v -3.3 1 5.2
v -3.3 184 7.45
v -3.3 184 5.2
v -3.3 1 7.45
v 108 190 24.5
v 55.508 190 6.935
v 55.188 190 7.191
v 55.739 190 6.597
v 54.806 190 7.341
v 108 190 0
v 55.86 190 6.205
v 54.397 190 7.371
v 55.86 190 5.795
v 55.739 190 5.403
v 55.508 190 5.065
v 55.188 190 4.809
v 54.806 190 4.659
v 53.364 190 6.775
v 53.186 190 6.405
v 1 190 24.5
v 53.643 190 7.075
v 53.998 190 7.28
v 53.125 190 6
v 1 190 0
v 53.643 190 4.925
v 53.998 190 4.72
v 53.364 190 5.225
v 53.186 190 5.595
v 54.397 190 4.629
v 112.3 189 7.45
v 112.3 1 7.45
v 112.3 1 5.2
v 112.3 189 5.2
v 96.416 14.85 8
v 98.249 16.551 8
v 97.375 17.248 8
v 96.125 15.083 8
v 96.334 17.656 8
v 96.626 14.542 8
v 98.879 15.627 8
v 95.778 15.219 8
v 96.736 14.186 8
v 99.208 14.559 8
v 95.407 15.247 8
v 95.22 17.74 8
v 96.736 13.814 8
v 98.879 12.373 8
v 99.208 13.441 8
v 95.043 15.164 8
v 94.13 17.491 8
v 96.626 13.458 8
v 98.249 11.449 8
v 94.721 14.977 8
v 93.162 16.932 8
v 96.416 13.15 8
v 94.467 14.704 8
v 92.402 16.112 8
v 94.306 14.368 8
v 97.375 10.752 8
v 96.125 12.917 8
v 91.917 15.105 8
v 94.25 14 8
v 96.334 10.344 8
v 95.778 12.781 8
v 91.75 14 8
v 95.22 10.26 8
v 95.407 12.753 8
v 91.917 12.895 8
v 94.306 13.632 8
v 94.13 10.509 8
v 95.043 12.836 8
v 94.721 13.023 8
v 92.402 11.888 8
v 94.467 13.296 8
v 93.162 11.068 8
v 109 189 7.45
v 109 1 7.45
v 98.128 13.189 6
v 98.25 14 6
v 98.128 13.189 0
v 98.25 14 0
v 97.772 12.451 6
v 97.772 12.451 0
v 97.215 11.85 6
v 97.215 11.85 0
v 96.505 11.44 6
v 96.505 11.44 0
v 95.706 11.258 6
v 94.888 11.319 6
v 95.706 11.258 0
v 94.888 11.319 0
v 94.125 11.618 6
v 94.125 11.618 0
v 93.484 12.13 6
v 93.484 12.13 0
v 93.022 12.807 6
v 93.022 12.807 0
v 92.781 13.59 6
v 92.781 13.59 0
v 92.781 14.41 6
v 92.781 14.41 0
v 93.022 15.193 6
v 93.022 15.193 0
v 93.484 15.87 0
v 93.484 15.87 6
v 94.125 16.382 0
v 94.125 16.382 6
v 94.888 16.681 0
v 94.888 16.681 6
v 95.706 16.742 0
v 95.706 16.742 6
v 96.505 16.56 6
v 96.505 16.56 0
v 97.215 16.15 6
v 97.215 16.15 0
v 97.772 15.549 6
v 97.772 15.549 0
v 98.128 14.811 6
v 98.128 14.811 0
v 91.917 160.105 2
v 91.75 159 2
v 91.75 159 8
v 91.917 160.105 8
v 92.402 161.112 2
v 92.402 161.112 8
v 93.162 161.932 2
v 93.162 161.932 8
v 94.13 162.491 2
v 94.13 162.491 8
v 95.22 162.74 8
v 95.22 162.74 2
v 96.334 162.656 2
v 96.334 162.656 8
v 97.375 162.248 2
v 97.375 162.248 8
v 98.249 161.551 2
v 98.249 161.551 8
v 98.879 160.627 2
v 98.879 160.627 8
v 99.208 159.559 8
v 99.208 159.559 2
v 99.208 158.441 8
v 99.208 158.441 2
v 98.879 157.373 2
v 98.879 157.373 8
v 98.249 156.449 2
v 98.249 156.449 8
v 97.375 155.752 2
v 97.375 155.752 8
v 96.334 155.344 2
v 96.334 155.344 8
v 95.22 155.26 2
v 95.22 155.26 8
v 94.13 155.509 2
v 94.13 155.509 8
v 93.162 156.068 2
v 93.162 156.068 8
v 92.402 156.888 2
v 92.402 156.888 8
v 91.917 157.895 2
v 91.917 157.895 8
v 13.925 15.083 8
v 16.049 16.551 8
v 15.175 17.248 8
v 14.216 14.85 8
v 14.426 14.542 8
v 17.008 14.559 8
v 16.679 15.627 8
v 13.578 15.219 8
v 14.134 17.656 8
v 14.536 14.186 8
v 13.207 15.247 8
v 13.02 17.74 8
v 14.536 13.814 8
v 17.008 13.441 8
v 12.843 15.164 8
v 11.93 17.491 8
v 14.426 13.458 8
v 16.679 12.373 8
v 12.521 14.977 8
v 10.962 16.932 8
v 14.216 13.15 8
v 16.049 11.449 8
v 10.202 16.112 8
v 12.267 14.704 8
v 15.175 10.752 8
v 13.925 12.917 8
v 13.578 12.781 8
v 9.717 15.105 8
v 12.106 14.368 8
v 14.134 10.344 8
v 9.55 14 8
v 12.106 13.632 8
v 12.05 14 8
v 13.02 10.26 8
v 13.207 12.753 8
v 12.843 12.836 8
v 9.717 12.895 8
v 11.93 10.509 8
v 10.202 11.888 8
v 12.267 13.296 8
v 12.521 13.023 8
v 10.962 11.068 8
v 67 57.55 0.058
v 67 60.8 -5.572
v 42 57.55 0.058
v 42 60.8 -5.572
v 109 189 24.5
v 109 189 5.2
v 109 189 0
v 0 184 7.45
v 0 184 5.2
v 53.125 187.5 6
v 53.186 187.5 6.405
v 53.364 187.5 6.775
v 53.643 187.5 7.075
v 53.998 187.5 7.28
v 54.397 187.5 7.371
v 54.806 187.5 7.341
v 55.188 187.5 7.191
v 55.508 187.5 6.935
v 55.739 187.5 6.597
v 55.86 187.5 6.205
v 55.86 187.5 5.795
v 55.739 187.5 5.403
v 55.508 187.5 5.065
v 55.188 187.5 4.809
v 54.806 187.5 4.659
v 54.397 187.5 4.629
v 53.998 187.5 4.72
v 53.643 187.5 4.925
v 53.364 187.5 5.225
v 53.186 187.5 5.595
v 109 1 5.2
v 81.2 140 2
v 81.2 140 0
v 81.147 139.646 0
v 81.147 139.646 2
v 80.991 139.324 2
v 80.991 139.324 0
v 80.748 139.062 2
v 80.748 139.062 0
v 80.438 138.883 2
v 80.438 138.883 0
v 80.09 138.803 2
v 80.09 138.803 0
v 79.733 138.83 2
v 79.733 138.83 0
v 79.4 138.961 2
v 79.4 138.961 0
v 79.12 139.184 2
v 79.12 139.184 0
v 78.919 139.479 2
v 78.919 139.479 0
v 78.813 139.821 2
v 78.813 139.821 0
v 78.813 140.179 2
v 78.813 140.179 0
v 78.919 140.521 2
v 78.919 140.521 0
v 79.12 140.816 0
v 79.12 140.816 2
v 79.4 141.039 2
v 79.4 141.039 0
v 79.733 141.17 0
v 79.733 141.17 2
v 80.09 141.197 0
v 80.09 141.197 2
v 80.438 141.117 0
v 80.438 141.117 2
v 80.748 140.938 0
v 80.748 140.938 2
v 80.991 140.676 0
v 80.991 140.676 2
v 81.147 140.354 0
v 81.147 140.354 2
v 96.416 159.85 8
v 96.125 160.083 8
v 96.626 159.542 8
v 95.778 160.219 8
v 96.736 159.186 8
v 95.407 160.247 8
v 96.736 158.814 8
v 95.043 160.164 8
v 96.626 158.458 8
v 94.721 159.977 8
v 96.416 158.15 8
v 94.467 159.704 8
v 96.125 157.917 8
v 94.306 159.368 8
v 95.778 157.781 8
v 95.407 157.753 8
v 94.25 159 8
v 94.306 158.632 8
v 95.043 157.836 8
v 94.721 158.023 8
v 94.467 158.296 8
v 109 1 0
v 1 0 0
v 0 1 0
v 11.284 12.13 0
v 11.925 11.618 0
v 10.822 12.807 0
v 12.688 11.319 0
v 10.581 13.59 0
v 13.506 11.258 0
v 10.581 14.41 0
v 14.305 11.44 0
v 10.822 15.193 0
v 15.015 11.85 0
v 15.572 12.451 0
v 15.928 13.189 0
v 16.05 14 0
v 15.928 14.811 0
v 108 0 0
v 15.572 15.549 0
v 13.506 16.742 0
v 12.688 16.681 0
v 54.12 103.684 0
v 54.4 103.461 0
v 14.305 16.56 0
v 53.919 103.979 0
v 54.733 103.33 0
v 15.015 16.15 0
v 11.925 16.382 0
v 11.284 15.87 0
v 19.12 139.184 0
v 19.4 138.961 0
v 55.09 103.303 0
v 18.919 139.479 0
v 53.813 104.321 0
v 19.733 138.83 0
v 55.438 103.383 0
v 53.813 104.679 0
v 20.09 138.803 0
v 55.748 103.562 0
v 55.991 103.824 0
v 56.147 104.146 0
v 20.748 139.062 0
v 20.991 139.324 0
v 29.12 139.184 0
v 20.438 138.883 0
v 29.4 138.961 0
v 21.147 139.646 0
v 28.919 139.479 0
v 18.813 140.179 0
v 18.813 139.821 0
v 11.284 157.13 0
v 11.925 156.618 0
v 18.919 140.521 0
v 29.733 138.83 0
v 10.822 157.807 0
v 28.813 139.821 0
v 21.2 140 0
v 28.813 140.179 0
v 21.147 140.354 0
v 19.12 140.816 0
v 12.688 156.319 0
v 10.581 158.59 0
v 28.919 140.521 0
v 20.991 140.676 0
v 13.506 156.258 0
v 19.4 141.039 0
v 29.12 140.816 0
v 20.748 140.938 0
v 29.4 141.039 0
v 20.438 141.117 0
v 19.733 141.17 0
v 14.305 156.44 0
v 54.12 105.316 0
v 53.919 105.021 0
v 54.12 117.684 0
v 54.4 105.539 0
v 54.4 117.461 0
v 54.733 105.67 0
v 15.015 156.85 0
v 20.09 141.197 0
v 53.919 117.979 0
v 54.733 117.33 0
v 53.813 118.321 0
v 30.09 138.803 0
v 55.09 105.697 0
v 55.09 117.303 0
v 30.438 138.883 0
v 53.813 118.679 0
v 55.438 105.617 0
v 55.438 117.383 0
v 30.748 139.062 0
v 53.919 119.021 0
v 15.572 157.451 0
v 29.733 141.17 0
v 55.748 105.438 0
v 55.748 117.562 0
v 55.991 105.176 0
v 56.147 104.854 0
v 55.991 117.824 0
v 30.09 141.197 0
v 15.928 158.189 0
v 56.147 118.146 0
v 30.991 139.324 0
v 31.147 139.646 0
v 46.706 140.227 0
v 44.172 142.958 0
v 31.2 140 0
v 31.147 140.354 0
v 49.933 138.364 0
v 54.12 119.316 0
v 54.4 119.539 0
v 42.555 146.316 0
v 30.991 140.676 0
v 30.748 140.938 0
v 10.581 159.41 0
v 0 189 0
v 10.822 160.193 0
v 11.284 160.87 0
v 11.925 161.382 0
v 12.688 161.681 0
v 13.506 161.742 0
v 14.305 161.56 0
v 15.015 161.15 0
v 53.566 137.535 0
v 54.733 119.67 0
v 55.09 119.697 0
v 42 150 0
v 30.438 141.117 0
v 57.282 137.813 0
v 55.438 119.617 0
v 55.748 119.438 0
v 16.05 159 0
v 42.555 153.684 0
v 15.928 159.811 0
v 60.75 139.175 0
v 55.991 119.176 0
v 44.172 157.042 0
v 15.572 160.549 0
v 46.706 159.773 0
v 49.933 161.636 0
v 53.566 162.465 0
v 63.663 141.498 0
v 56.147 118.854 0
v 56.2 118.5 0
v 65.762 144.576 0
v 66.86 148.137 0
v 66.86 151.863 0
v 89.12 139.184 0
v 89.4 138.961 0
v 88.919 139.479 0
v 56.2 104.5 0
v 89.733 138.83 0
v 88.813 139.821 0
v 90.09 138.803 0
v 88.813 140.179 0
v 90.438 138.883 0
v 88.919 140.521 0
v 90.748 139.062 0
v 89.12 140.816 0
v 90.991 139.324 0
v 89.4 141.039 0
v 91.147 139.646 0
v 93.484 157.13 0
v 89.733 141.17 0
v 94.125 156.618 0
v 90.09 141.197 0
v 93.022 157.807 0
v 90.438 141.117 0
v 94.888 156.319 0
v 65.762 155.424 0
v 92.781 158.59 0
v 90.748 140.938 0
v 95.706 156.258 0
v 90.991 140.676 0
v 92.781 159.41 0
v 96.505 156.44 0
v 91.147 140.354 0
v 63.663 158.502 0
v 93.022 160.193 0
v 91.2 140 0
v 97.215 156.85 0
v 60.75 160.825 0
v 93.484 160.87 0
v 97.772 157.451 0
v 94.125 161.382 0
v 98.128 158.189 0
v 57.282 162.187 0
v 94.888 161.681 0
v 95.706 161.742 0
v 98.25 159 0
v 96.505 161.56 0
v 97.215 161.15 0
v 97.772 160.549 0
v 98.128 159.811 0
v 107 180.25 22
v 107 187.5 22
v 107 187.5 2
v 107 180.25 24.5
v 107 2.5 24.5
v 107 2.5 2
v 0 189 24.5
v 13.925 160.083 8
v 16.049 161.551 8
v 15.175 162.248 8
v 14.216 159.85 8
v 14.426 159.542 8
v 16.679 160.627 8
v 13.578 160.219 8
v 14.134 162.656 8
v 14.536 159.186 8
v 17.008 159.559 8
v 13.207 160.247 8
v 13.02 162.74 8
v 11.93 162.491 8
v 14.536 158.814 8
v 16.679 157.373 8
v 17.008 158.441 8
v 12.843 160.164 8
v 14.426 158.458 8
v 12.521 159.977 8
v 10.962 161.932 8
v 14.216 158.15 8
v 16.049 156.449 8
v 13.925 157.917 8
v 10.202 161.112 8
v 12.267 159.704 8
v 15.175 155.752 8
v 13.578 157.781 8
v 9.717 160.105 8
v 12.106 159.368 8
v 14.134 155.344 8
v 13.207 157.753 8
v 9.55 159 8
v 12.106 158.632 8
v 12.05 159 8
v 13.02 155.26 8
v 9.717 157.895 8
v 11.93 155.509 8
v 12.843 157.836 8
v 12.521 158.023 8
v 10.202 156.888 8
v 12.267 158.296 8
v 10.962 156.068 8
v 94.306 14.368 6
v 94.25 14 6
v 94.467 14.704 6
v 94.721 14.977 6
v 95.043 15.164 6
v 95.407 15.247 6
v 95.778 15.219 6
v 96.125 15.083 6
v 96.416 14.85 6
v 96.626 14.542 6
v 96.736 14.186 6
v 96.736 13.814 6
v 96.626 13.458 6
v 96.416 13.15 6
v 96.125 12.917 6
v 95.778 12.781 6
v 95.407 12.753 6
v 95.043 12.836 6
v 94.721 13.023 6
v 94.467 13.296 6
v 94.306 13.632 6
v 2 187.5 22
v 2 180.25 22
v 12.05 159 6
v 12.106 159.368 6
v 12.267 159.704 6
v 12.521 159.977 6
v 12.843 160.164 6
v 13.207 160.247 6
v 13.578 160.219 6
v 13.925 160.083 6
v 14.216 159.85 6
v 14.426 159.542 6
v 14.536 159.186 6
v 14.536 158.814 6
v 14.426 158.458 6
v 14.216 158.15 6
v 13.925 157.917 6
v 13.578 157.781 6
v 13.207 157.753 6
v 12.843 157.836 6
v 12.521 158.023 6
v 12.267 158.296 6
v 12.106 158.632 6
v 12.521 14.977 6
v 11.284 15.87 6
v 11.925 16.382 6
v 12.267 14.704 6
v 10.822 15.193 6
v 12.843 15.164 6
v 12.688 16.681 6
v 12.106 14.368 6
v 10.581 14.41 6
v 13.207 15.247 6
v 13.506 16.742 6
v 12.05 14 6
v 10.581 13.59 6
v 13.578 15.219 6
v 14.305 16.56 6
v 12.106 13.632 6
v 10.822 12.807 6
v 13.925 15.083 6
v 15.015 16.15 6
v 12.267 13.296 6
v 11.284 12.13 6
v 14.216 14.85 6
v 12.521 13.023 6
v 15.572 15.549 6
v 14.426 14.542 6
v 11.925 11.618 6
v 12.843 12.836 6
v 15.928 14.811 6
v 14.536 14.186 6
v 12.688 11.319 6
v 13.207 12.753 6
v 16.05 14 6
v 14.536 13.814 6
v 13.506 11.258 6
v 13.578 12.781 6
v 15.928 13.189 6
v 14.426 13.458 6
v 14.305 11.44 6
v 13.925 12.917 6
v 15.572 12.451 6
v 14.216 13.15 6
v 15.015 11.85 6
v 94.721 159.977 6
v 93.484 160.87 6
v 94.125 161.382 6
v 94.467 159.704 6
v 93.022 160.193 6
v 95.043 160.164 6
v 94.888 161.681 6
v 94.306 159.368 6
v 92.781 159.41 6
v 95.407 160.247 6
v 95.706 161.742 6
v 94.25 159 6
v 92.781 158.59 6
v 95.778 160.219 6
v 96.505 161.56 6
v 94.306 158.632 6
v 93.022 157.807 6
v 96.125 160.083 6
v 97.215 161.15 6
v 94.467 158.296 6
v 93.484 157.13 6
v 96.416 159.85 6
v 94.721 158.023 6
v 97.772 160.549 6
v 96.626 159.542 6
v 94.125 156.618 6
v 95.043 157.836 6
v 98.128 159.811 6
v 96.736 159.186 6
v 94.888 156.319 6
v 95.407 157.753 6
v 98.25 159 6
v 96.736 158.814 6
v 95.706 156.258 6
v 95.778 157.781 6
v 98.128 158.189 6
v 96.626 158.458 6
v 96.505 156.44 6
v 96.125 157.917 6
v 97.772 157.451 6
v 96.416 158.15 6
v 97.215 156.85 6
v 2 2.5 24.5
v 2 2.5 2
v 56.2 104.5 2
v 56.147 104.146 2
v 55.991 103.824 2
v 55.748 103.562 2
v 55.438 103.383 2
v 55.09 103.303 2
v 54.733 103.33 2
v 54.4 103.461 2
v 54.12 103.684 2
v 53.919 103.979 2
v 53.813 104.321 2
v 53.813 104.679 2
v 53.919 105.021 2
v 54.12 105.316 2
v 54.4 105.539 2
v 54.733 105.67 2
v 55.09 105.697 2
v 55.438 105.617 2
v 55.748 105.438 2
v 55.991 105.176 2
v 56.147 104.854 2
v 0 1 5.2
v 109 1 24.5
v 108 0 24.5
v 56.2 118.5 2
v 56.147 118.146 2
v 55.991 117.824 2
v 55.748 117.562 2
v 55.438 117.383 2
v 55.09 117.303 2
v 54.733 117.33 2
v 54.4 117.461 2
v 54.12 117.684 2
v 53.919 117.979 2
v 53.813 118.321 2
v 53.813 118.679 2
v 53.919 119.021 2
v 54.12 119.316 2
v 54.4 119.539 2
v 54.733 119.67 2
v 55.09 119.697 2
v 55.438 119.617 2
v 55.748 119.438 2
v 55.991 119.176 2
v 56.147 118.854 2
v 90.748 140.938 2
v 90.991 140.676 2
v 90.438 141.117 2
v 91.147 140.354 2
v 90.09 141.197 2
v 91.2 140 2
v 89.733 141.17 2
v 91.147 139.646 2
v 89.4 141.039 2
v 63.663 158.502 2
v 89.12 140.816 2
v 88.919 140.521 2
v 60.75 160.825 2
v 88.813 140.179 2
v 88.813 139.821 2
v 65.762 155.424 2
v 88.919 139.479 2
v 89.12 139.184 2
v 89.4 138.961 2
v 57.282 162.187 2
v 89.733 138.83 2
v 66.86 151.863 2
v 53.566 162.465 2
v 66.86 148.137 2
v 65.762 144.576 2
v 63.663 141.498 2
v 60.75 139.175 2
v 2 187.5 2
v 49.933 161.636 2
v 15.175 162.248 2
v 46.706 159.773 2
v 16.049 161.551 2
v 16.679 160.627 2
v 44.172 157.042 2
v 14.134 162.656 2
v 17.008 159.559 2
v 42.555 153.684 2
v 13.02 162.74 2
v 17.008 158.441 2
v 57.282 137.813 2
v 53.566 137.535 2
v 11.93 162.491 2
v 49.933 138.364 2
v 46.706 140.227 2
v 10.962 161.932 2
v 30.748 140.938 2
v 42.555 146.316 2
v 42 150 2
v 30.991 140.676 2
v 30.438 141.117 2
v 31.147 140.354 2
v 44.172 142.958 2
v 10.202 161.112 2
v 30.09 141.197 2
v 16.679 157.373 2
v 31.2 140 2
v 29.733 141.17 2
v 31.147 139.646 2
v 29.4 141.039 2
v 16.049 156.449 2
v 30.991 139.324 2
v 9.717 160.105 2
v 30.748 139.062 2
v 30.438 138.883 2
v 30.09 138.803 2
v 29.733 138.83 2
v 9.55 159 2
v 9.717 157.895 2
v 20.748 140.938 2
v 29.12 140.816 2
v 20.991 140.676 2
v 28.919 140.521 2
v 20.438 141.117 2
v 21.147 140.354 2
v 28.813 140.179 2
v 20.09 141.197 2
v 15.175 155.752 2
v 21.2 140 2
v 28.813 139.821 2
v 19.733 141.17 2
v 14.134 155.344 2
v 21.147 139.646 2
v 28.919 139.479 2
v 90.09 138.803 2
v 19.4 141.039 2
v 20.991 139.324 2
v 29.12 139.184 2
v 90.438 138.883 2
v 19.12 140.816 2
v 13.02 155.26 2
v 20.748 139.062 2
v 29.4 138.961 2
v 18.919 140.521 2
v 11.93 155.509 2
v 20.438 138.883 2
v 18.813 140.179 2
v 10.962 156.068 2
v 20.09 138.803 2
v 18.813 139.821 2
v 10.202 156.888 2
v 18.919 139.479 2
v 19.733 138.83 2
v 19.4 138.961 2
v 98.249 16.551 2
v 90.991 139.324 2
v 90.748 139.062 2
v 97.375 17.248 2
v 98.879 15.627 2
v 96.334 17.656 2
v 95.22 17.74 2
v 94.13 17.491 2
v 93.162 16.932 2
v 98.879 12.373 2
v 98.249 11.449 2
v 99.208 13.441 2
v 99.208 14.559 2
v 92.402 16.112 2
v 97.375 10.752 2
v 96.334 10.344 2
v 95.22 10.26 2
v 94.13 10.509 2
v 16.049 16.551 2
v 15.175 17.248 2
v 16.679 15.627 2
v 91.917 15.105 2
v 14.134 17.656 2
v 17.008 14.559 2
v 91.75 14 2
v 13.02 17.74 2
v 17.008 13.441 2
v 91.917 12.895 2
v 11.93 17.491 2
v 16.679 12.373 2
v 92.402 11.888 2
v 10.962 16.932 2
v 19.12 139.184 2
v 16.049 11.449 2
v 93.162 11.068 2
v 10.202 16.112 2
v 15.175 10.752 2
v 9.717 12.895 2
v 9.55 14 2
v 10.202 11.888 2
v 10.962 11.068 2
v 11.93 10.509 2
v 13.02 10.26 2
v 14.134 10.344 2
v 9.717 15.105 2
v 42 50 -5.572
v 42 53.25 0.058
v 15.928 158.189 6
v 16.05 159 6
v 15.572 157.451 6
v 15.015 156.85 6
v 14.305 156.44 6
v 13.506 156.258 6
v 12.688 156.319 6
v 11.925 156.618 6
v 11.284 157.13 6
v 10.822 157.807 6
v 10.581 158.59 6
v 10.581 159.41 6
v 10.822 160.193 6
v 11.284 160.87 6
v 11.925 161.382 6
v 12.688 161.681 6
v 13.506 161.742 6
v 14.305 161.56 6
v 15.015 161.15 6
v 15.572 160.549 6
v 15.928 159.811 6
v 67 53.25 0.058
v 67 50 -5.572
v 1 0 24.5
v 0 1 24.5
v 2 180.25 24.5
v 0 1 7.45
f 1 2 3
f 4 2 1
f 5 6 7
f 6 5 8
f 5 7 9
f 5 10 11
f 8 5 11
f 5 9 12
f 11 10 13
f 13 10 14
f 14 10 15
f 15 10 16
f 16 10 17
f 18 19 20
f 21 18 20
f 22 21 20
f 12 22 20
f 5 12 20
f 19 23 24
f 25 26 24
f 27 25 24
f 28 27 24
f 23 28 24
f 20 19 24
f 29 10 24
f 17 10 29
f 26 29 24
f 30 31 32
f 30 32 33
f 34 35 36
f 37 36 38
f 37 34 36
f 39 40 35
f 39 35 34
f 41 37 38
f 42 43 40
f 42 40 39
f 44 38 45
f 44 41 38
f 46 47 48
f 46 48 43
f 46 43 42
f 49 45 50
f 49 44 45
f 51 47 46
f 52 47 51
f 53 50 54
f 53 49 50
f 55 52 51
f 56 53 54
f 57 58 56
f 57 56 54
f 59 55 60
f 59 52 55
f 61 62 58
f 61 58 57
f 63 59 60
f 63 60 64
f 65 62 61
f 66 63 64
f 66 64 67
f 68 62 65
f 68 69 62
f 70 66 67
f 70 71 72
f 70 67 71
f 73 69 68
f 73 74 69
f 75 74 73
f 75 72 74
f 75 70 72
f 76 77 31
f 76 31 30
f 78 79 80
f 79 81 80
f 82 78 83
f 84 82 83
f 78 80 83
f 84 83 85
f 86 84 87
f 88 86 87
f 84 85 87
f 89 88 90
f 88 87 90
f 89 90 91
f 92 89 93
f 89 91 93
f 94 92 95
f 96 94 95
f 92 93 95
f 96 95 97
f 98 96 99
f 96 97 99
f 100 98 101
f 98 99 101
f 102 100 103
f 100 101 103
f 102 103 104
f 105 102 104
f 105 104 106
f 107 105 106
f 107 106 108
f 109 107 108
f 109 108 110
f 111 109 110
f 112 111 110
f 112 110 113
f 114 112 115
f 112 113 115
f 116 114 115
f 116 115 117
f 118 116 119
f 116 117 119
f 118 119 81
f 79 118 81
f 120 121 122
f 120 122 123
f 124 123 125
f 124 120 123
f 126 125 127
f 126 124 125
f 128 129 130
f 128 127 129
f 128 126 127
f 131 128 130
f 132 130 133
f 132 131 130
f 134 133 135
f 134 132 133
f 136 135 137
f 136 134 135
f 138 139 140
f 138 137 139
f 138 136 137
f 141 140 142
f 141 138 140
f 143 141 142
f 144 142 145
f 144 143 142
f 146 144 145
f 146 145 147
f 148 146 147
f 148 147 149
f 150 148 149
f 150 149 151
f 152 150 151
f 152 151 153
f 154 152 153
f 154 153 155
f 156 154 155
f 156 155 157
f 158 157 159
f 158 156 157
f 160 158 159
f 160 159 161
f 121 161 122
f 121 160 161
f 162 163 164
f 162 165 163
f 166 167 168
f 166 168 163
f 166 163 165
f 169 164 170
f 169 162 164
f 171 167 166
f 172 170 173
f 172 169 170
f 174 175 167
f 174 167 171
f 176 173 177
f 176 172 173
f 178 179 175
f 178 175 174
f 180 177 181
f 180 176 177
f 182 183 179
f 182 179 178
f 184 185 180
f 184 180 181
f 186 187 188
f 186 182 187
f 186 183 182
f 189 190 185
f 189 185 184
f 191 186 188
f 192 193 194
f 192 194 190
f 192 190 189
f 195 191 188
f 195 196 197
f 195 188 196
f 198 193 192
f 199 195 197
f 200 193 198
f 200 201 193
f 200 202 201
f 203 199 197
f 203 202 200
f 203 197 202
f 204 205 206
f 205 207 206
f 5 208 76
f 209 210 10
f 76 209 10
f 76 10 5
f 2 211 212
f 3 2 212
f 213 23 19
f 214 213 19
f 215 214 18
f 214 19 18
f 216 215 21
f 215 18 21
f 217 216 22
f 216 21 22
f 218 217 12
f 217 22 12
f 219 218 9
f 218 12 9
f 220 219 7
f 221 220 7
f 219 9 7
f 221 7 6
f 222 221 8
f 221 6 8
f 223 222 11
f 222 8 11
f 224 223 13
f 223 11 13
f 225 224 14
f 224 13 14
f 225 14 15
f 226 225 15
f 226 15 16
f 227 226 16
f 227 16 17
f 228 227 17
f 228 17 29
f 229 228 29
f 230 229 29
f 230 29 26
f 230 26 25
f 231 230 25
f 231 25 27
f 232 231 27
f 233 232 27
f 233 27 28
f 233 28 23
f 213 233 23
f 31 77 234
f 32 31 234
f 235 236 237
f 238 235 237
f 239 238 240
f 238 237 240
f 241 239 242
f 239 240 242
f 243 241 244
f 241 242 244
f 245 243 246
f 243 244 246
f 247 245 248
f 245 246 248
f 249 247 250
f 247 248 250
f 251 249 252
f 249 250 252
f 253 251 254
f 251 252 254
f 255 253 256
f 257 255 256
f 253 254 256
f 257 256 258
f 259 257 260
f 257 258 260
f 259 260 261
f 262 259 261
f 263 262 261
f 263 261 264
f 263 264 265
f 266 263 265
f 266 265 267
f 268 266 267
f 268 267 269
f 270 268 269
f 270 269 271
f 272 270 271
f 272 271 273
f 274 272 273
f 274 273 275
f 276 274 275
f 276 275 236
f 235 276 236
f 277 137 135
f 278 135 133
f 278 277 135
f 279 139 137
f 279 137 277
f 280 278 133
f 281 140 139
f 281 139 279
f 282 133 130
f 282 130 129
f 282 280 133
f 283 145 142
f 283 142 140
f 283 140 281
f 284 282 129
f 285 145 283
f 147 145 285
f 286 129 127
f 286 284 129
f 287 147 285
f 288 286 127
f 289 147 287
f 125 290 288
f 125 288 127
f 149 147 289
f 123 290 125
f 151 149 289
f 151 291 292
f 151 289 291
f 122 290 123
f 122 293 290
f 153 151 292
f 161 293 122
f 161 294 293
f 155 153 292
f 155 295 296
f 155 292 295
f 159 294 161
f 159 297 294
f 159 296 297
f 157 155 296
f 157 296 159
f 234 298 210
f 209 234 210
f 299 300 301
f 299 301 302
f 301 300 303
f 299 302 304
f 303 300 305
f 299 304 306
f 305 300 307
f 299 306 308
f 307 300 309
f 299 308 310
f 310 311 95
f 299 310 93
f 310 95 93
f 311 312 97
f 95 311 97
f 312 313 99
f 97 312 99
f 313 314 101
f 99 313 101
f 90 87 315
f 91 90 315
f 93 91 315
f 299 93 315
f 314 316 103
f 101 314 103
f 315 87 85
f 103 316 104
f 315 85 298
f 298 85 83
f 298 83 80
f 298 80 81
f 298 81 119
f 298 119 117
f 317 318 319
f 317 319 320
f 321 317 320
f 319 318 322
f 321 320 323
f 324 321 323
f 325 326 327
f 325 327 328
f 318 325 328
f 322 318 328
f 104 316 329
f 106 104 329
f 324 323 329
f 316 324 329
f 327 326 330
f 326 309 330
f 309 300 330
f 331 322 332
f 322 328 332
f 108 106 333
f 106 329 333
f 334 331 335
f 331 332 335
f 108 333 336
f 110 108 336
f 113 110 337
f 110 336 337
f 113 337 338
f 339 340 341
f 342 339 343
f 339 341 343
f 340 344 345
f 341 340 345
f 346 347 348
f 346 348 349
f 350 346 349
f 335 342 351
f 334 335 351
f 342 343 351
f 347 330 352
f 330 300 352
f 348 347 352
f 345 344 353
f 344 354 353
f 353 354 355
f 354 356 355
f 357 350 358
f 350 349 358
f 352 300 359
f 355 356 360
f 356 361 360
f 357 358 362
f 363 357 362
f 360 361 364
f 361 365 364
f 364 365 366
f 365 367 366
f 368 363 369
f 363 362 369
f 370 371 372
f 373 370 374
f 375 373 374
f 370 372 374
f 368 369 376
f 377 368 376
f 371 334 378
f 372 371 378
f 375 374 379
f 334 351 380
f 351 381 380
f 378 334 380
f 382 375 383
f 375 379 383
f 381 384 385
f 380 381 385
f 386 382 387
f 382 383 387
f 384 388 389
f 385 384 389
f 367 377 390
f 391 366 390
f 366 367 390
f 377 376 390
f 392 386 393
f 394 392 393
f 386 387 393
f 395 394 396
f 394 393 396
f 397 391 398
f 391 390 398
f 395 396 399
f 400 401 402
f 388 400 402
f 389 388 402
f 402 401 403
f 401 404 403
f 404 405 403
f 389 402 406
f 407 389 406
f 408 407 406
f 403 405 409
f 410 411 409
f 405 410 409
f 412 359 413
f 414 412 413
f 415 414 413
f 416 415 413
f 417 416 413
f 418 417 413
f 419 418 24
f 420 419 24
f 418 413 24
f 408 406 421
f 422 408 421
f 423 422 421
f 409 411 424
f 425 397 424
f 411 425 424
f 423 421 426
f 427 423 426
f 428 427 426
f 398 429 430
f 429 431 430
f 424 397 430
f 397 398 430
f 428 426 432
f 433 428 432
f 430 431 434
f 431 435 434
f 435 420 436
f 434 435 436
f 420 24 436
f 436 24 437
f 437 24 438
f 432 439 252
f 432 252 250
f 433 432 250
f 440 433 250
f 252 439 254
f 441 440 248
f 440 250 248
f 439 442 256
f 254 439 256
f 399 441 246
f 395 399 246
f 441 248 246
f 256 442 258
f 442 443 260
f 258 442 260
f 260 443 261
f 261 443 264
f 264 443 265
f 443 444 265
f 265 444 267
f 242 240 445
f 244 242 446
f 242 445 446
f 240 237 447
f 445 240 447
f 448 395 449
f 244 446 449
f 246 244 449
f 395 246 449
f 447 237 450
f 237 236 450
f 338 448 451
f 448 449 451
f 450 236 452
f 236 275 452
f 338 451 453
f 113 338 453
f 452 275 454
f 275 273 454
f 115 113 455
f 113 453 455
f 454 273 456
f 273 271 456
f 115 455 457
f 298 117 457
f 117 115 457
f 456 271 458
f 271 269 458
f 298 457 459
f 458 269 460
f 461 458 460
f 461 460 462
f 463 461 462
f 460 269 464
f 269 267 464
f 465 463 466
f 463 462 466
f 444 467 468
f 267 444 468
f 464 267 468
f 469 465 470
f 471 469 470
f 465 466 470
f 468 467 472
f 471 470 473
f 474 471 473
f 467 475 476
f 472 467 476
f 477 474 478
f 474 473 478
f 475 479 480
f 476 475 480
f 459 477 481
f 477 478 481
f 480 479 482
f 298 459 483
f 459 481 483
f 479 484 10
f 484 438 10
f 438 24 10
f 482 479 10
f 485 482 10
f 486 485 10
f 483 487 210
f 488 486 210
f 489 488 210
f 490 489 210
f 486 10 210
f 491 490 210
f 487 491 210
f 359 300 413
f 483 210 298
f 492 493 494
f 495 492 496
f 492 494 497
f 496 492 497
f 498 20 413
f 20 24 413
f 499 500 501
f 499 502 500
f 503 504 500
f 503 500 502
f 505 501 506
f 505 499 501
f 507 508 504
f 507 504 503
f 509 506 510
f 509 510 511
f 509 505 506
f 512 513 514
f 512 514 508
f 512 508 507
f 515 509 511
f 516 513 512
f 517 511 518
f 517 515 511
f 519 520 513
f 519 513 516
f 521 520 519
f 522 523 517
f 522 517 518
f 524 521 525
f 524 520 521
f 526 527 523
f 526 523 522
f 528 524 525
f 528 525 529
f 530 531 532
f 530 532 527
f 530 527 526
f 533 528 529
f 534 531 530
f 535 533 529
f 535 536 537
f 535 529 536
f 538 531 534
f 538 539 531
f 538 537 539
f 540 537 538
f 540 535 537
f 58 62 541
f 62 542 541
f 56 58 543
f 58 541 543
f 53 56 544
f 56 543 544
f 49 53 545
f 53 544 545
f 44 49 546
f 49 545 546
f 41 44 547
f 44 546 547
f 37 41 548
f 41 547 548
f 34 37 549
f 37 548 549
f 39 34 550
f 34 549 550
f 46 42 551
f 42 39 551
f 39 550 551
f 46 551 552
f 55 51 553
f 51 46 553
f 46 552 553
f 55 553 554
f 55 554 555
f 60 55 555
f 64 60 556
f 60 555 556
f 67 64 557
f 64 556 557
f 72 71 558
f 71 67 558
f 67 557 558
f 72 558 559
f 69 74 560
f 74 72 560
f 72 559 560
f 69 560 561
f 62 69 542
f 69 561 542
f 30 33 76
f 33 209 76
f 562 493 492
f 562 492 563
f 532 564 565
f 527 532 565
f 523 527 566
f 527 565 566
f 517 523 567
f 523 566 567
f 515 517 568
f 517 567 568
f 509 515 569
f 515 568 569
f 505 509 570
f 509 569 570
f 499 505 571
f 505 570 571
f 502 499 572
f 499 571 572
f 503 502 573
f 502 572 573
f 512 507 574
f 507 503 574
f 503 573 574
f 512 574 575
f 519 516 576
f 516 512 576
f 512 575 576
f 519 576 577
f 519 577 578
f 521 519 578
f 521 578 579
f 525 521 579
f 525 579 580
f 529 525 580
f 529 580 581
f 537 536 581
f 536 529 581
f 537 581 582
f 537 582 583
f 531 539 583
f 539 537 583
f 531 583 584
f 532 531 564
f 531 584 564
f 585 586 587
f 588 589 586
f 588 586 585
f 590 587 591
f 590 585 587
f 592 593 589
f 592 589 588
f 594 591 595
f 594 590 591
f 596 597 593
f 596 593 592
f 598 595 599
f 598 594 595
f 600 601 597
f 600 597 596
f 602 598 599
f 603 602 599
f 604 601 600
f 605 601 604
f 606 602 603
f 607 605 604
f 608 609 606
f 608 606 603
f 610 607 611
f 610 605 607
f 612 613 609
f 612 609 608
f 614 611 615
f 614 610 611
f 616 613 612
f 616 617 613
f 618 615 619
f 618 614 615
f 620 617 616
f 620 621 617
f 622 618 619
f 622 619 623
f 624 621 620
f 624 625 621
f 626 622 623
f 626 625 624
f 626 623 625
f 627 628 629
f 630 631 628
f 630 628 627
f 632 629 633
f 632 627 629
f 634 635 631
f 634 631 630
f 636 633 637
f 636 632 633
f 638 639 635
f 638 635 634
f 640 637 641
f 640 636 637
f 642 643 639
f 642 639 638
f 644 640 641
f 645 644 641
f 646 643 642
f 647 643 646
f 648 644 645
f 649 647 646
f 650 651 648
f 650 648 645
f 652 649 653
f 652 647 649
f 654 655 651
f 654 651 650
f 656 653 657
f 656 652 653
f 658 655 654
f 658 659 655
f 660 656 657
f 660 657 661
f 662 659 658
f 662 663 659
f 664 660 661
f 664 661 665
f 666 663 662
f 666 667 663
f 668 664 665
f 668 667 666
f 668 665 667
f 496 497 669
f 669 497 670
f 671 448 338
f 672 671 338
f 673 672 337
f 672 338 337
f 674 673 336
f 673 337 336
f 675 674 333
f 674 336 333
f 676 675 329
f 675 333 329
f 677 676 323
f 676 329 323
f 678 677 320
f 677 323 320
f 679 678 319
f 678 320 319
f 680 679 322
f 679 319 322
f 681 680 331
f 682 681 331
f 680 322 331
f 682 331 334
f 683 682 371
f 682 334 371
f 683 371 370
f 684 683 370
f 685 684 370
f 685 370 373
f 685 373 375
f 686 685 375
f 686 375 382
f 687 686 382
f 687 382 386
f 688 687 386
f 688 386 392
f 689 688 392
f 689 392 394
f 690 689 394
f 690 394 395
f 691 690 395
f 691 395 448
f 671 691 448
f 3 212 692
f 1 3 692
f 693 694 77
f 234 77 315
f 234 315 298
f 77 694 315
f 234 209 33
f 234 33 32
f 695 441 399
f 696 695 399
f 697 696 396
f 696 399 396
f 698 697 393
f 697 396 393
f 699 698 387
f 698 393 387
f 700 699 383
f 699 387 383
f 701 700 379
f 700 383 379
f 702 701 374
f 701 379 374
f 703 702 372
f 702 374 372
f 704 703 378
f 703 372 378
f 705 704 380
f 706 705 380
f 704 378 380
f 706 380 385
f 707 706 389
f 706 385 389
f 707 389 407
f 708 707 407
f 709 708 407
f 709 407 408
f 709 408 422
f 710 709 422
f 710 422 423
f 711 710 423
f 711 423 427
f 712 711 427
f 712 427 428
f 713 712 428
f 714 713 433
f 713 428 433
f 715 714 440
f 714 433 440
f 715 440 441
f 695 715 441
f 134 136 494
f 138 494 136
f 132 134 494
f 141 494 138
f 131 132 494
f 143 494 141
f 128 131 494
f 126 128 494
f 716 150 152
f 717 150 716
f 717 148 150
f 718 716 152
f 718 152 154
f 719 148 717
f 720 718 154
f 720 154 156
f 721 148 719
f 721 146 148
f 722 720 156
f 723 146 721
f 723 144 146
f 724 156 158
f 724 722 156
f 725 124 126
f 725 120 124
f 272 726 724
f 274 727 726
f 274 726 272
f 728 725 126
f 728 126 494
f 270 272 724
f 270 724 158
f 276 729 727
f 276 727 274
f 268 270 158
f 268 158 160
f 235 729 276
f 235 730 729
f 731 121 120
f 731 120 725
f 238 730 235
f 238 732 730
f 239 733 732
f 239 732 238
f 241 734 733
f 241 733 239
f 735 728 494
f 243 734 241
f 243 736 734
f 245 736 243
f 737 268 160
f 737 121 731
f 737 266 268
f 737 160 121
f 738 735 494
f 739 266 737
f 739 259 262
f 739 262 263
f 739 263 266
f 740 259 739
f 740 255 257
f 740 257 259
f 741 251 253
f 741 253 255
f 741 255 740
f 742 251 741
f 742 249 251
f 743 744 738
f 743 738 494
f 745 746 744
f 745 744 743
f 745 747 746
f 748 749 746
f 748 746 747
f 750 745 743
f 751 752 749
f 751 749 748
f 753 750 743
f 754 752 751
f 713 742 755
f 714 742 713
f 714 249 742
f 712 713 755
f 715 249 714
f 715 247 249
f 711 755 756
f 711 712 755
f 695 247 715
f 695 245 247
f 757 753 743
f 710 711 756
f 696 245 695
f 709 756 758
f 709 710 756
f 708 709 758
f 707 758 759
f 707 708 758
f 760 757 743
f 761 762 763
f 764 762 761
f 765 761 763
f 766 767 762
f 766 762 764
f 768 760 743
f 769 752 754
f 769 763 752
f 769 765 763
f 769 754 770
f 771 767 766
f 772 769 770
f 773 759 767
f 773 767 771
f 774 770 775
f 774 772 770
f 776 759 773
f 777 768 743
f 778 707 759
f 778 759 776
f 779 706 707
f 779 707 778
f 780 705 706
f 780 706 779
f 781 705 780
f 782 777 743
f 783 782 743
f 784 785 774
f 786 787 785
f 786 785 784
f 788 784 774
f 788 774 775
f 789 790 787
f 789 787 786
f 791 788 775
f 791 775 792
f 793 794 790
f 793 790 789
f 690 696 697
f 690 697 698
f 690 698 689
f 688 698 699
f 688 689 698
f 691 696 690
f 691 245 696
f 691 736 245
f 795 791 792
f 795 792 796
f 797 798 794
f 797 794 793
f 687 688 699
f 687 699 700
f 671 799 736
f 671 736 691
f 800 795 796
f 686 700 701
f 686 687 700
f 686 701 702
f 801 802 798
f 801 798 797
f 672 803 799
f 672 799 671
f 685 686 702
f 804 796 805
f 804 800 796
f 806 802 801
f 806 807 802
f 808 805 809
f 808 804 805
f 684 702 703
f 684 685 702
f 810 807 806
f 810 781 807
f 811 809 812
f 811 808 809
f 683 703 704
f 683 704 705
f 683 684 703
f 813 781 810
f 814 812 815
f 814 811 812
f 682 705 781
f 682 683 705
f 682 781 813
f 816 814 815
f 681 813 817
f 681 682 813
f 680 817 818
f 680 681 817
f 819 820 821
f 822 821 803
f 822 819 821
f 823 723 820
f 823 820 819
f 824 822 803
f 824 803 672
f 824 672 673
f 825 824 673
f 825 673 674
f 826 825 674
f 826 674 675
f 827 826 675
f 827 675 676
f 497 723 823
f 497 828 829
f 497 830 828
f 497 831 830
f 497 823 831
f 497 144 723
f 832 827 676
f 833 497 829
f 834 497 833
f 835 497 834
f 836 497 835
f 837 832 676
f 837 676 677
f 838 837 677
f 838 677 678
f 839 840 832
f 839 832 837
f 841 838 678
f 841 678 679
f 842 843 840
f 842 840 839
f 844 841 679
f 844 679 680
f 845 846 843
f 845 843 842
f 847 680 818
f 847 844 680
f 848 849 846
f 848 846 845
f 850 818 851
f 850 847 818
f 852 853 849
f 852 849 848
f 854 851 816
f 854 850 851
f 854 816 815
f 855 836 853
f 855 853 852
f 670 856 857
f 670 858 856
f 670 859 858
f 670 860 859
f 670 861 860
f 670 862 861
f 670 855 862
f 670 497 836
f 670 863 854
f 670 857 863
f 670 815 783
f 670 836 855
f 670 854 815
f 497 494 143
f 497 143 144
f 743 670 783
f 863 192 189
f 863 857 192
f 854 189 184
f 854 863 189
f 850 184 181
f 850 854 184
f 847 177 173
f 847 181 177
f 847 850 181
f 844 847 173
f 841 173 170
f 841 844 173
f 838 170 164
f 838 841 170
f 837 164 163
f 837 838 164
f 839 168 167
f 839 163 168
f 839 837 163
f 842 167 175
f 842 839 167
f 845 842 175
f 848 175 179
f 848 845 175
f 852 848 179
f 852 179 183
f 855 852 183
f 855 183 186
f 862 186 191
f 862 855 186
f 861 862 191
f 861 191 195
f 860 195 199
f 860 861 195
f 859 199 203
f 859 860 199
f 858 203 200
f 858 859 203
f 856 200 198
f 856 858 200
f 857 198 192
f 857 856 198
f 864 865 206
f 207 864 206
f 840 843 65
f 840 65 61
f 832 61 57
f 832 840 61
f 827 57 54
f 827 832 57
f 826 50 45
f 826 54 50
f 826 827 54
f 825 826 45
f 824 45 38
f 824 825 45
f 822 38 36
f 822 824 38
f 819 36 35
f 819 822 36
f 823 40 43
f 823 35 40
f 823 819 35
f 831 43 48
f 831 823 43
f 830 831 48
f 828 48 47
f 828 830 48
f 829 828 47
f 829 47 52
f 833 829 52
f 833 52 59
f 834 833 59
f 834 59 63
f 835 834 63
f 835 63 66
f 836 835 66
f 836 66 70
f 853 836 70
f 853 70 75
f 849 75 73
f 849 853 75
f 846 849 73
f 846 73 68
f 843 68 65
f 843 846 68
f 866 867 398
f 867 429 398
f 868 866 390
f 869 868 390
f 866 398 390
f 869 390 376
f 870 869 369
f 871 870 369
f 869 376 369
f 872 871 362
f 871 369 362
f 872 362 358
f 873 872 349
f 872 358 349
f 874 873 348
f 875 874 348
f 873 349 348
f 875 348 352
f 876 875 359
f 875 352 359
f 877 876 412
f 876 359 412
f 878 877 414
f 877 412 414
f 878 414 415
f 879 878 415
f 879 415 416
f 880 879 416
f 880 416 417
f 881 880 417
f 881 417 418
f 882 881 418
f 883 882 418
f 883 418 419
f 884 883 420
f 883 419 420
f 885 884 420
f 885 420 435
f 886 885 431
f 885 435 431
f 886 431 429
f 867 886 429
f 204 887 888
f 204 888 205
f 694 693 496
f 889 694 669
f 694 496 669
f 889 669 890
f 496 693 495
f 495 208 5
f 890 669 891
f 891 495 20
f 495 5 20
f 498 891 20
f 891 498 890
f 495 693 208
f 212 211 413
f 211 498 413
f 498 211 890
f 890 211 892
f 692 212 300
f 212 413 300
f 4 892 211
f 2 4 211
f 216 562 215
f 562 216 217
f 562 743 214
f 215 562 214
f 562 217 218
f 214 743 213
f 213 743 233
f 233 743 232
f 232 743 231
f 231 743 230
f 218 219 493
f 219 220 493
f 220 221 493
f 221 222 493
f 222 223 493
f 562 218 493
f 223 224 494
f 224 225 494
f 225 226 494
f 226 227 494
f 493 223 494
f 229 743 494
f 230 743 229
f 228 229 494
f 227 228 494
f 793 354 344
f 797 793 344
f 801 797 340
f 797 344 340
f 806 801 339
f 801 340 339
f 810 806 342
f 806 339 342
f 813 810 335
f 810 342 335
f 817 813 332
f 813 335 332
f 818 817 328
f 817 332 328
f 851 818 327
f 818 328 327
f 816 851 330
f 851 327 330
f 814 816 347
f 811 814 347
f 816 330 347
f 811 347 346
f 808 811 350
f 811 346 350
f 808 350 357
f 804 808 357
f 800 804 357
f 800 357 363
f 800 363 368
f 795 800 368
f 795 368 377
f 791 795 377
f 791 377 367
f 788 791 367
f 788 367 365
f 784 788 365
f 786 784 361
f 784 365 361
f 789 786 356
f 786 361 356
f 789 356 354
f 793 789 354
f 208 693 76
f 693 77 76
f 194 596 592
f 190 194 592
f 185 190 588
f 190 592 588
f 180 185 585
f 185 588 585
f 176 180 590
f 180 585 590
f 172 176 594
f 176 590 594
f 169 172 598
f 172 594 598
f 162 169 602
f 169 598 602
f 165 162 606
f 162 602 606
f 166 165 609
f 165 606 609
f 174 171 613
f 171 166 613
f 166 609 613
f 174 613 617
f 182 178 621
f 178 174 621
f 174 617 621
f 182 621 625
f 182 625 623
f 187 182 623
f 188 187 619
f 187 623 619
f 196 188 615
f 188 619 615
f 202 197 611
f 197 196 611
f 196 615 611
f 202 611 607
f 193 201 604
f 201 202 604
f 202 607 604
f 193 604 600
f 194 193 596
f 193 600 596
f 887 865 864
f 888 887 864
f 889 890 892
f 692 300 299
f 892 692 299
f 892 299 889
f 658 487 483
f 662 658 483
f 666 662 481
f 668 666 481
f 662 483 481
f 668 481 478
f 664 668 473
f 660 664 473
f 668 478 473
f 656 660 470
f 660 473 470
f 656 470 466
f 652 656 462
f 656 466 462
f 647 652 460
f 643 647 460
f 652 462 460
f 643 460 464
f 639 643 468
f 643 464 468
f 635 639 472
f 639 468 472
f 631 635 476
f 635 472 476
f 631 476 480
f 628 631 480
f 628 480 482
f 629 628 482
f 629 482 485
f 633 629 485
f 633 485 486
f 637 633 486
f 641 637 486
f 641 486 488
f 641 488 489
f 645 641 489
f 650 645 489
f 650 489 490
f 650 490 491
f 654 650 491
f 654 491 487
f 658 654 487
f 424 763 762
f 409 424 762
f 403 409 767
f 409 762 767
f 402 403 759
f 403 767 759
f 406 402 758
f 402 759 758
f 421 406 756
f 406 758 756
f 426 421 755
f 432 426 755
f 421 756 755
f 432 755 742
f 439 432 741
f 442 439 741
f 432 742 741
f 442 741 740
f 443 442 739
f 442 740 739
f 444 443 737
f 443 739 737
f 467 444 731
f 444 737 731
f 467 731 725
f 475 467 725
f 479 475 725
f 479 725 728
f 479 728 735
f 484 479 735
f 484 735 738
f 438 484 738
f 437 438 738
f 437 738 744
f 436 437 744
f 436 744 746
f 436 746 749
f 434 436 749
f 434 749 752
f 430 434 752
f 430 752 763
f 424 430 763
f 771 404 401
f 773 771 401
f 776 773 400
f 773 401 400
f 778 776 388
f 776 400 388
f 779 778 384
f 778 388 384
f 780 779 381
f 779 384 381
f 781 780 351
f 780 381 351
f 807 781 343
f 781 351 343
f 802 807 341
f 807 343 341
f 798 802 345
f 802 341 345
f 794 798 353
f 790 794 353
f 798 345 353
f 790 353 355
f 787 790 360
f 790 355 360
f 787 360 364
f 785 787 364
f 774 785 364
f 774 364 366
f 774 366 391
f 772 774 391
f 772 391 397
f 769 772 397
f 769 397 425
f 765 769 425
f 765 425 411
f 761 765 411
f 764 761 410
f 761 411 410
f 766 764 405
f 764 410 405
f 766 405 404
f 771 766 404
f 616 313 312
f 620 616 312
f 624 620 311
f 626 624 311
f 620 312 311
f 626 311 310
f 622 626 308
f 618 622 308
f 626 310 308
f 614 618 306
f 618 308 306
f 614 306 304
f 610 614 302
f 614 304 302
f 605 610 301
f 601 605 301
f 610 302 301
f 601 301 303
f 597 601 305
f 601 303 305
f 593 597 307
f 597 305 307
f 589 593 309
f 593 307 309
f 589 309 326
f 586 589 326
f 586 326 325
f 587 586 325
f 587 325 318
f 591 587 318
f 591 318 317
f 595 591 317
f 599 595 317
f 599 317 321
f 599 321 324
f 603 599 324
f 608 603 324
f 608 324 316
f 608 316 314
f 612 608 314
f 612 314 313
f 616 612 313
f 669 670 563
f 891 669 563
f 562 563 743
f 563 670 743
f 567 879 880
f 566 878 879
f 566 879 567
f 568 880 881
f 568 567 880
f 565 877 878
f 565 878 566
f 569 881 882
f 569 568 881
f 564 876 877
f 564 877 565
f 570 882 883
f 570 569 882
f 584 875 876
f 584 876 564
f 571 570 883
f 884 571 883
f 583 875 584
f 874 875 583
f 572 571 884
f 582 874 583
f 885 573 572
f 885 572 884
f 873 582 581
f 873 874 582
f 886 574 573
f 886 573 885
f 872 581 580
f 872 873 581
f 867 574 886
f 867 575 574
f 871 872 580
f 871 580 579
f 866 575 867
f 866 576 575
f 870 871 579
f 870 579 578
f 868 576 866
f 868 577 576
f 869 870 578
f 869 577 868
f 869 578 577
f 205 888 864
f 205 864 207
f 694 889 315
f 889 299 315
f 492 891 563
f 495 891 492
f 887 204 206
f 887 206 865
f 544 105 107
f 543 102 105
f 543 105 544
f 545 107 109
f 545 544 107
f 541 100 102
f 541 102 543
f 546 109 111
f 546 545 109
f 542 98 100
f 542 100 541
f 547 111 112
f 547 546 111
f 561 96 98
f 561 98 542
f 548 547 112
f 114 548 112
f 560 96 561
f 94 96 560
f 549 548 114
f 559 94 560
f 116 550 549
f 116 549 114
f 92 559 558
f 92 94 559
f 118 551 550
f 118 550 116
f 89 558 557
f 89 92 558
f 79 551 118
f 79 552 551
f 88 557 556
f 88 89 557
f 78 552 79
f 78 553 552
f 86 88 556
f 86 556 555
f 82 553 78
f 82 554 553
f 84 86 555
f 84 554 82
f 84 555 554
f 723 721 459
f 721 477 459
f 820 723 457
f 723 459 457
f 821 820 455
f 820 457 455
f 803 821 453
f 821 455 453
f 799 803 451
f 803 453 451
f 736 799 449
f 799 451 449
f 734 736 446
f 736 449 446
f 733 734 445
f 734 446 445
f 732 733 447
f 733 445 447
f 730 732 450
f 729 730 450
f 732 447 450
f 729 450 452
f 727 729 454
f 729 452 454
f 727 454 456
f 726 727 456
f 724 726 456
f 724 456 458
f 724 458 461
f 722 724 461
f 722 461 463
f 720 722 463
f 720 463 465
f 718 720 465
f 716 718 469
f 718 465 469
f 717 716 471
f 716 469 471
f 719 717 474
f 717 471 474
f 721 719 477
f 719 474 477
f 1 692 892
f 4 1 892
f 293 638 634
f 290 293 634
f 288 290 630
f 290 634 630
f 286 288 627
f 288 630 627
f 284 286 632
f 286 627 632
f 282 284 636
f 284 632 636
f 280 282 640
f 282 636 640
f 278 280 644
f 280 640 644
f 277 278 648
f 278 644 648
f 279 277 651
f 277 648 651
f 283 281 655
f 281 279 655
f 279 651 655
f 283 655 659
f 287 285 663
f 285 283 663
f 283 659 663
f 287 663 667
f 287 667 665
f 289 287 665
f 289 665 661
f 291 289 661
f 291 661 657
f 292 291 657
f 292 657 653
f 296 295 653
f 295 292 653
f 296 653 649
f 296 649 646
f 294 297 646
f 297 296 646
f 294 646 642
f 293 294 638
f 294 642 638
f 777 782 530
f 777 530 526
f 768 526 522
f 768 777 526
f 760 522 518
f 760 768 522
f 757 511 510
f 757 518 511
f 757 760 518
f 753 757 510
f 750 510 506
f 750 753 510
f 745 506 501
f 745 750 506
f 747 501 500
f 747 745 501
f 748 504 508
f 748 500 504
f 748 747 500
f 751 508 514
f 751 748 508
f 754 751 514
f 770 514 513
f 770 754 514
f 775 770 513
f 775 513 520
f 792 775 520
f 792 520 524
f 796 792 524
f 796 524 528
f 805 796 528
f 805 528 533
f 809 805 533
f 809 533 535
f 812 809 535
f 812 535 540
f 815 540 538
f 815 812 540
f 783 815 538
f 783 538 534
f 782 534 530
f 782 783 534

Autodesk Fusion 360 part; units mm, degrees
sketch "Sketch1" plane through (0, 0, 0) normal (0, 0, 1) x (1, 0, 0)
  line L0 (0, 0) -> (109, 0)
  line L1 (109, 0) -> (109, 190)
  line L2 (109, 190) -> (0, 190)
  line L3 (0, 190) -> (0, 0)
  dimension "d1" = 190
  dimension "d2" = 109
extrude "Extrude1" add sketch "Sketch1" along normal blind 18.5 makes body 1
sketch "Sketch2" plane through (0, 0, 18.5) normal (0, 0, 1) x (-1, 0, 0)
  line L0 (0, -190) -> (0, 0)
  line L1 (0, 0) -> (-109, 0)
  line L2 (-109, 0) -> (-109, -190)
  line L3 (-109, -190) -> (0, -190)
  line L4 (-2, -187.5) -> (-107, -187.5)
  line L5 (-107, -187.5) -> (-107, -2.5)
  line L6 (-107, -2.5) -> (-2, -2.5)
  line L7 (-2, -2.5) -> (-2, -187.5)
  dimension "d5" = 2.5
  dimension "d6" = 2.5
  dimension "d7" = 2
  dimension "d8" = 2
extrude "Extrude2" cut sketch "Sketch2" against normal blind 16.5 contours L4 L5 L6 L7 bodies 1
chamfer "Chamfer1" distance 1 angle 45 4 edges at (0, 190, 9.25) (109, 190, 9.25) (0, 0, 9.25) (109, 0, 9.25) on bodies 1
sketch "Sketch3" plane through (0, 0, 2) normal (0, 0, 1) x (-1, 0, 0)
  line L0 (-2, -2.5) -> (-107, -2.5)
  line L1 (-107, -2.5) -> (-107, -187.5)
  line L2 (-107, -187.5) -> (-2, -187.5)
  line L3 (-2, -187.5) -> (-2, -2.5)
  circle A0 centre (-13.3, -159) radius 1.25
  circle A1 centre (-95.5, -159) radius 1.25
  circle A2 centre (-13.3, -14) radius 1.25
  circle A3 centre (-95.5, -14) radius 1.25
  dimension "d12" = 2.5
  dimension "d13" = 2.5
  dimension "d14" = 2.5
  dimension "d15" = 2.5
  dimension "d17" = 11.3
  dimension "d18" = 11.5
  dimension "d20" = 11.5
  dimension "d21" = 11.5
  dimension "d22" = 11.3
  dimension "d23" = 11.5
  dimension "d26" = 145
  dimension "d27" = 145
extrude "Extrude3" cut sketch "Sketch3" against normal blind 2.5 contours A0 | A1 | A2 | A3 bodies 1
sketch "Sketch4" plane through (0, 0, 0) normal (0, 0, -1) x (1, 0, 0)
  circle A0 centre (95.5, -14) radius 1.25
  circle A1 centre (95.5, -159) radius 1.25
  circle A2 centre (13.3, -14) radius 1.25
  circle A3 centre (13.3, -159) radius 1.25
  line L0 (109, -1) -> (108, 0)
  line L1 (108, 0) -> (1, 0)
  line L2 (1, 0) -> (0, -1)
  line L3 (0, -1) -> (0, -189)
  line L4 (0, -189) -> (1, -190)
  line L5 (1, -190) -> (108, -190)
  line L6 (108, -190) -> (109, -189)
  line L7 (109, -189) -> (109, -1)
  line L8 (6, -177.5) -> (6, -75)
  line L9 (103, -75) -> (103, -177.5)
  line L10 (8.5, -175) -> (8.5, -75)
  line L11 (100.5, -75) -> (100.5, -175)
  line L12 (103, -75) -> (100.5, -75)
  line L13 (8.5, -75) -> (6, -75)
  line L14 (100.5, -175) -> (100.5, -177.5)
  line L15 (8.5, -175) -> (8.5, -177.5)
  line L16 (103, -177.5) -> (103, -190)
  line L17 (6, -190) -> (6, -177.5)
  line L18 (100.5, -177.5) -> (100.5, -190)
  line L19 (103, -190) -> (100.5, -190)
  line L20 (8.5, -177.5) -> (8.5, -190)
  line L21 (6, -190) -> (8.5, -190)
  line L22 (8.5, -190) -> (6, -190)
  dimension "d28" = 6
  dimension "d29" = 6
  dimension "d32" = 2.5
  dimension "d34" = 2.5
  dimension "d38" = 115
  dimension "d39" = 115
sketch "Sketch5" plane through (0, 0, 2) normal (0, 0, 1) x (-1, 0, 0)
  circle A0 centre (-95.5, -14) radius 1.25
  circle A1 centre (-95.5, -159) radius 1.25
  circle A2 centre (-13.3, -14) radius 1.25
  circle A3 centre (-13.3, -159) radius 1.25
  line L0 (-2, -2.5) -> (-107, -2.5)
  line L1 (-107, -2.5) -> (-107, -187.5)
  line L2 (-107, -187.5) -> (-2, -187.5)
  line L3 (-2, -187.5) -> (-2, -2.5)
  circle A4 centre (-54.5, -150) radius 12.5
  line L4 (-109, -189) -> (-109, -1)
  line L5 (-1, -190) -> (-108, -190)
  dimension "d42" = 54.5
  dimension "d43" = 40
  dimension "d44" = 25
extrude "Extrude6" cut sketch "Sketch5" against normal blind 2.5 contours A4 bodies 1
ref_plane "WorkPlane1" through (42, 0, 0) normal (1, 0, 0) x (0, 1, 0)
sketch "Sketch16" plane through (42, 0, 0) normal (1, 0, 0) x (0, 1, 0)
  line L0 (57.55, 0.0575) -> (53.25, 0.0575)
  line L1 (50, -5.5717) -> (60.8, -5.5717)
  line L2 (60.8, -5.5717) -> (57.55, 0.0575)
  line L3 (53.25, 0.0575) -> (50, -5.5717)
  dimension "d74" = 120
  dimension "d75" = 120
  dimension "d76" = 10.8
  dimension "d77" = 6.5
  dimension "d90" = 50
extrude "Extrude16" add sketch "Sketch16" along normal blind 25 separate body makes body 2
sketch "Sketch17" plane through (0, 0, 0) normal (0, 0, -1) x (1, 0, 0)
  circle A0 centre (13.3, -14) radius 1.25
  circle A1 centre (95.5, -14) radius 1.25
  line L0 (1, -190) -> (108, -190)
  line L1 (108, -190) -> (109, -189)
  line L2 (109, -189) -> (109, -1)
  line L3 (109, -1) -> (108, 0)
  line L4 (108, 0) -> (1, 0)
  line L5 (1, 0) -> (0, -1)
  line L6 (0, -1) -> (0, -189)
  line L7 (0, -189) -> (1, -190)
  circle A2 centre (13.3, -159) radius 1.25
  circle A3 centre (95.5, -159) radius 1.25
  circle A4 centre (54.5, -150) radius 12.5
  line L8 (100.5, -182.7) -> (8.5, -182.7)
  line L9 (8.5, -182.7) -> (8.5, -180.7)
  line L10 (8.5, -180.7) -> (100.5, -180.7)
  line L11 (100.5, -180.7) -> (100.5, -182.7)
  dimension "d81" = 2
sketch "Sketch20" plane through (0, 0, 2) normal (0, 0, 1) x (-1, 0, 0)
  circle A0 centre (-54.5, -150) radius 12.5
  circle A1 centre (-95.5, -14) radius 1.25
  circle A2 centre (-95.5, -159) radius 1.25
  circle A3 centre (-13.3, -14) radius 1.25
  circle A4 centre (-13.3, -159) radius 1.25
  line L0 (-2, -2.5) -> (-107, -2.5)
  line L1 (-107, -2.5) -> (-107, -187.5)
  line L2 (-107, -187.5) -> (-2, -187.5)
  line L3 (-2, -187.5) -> (-2, -2.5)
  circle A5 centre (-13.3, -159) radius 3.75
  circle A6 centre (-95.5, -159) radius 3.75
  circle A7 centre (-13.3, -14) radius 3.75
  circle A8 centre (-95.5, -14) radius 3.75
  dimension "d91" = 7.5
  dimension "d92" = 7.5
  dimension "d93" = 7.5
  dimension "d94" = 7.5
extrude "Extrude20" add sketch "Sketch20" along normal blind 6 contours A5 | A6 | A7 | A8 bodies 1
sketch "Sketch21" plane through (0, 0, 18.5) normal (0, 0, 1) x (-1, 0, 0)
  line L0 (-107, -187.5) -> (-107, -2.5)
  line L1 (-107, -2.5) -> (-2, -2.5)
  line L2 (-2, -2.5) -> (-2, -187.5)
  line L3 (-2, -187.5) -> (-107, -187.5)
  line L4 (-108, 0) -> (-109, -1)
  line L5 (-109, -1) -> (-109, -189)
  line L6 (-109, -189) -> (-108, -190)
  line L7 (-108, -190) -> (-1, -190)
  line L8 (-1, -190) -> (0, -189)
  line L9 (0, -189) -> (0, -1)
  line L10 (0, -1) -> (-1, 0)
  line L11 (-1, 0) -> (-108, 0)
  line L12 (-1, -190) -> (-108, -190)
  line L13 (-109, -179) -> (-109, -1)
  line L14 (-108, 0) -> (-1, 0)
  line L15 (0, -1) -> (0, -179)
  line L16 (-108, 0) -> (-109, -1)
  line L17 (0, -1) -> (-1, 0)
  line L18 (0, -189) -> (-1, -190)
  line L19 (-108, -190) -> (-109, -189)
  line L20 (-2, -187.5) -> (-107, -187.5)
  line L21 (-107, -187.5) -> (-107, -2.5)
  line L22 (-107, -2.5) -> (-2, -2.5)
  line L23 (-2, -2.5) -> (-2, -187.5)
extrude "Extrude21" add sketch "Sketch21" along normal blind 6 bodies 1
sketch "Sketch23" plane through (0, 187.5, 0) normal (0, -1, 0) x (1, 0, 0)
  line L0 (2, 24.5) -> (2, 2)
  line L1 (2, 2) -> (107, 2)
  line L2 (107, 2) -> (107, 24.5)
  line L3 (107, 24.5) -> (2, 24.5)
  line L4 (2, 24.5) -> (107, 24.5)
  line L5 (107, 24.5) -> (107, 22)
  line L6 (107, 22) -> (2, 22)
  line L7 (2, 22) -> (2, 24.5)
extrude "Extrude22" add sketch "Sketch23" along normal blind 7.25 contours L0 L2 L3 L4 L5 L6 L7 bodies 1
sketch "Sketch24" plane through (0, 0, 0) normal (0, 0, -1) x (1, 0, 0)
  circle A0 centre (95.5, -14) radius 1.25
  circle A1 centre (13.3, -14) radius 1.25
  circle A2 centre (13.3, -159) radius 1.25
  circle A3 centre (95.5, -159) radius 1.25
  circle A4 centre (54.5, -150) radius 12.5
  line L0 (1, -190) -> (108, -190)
  line L1 (108, -190) -> (109, -189)
  line L2 (109, -189) -> (109, -1)
  line L3 (109, -1) -> (108, 0)
  line L4 (108, 0) -> (1, 0)
  line L5 (1, 0) -> (0, -1)
  line L6 (0, -1) -> (0, -189)
  line L7 (0, -189) -> (1, -190)
  circle A5 centre (13.3, -14) radius 2.75
  circle A6 centre (95.5, -14) radius 2.75
  circle A7 centre (95.5, -159) radius 2.75
  circle A8 centre (13.3, -159) radius 2.75
  circle A9 centre (90, -140) radius 1.2
  circle A10 centre (80, -140) radius 1.2
  circle A11 centre (30, -140) radius 1.2
  circle A12 centre (20, -140) radius 1.2
  circle A13 centre (55, -118.5) radius 1.2
  circle A14 centre (55, -104.5) radius 1.2
  line L8 (2, -2.5) -> (2, -187.5)
  line L9 (42, -60.8) -> (67, -60.8)
  dimension "d102" = 2.4
  dimension "d103" = 2.4
  dimension "d104" = 2.4
  dimension "d105" = 2.4
  dimension "d106" = 5.5
  dimension "d107" = 5.5
  dimension "d108" = 5.5
  dimension "d109" = 5.5
  dimension "d114" = 2.4
  dimension "d115" = 2.4
  dimension "d117" = 14
  dimension "d128" = 53
  dimension "d129" = 53
  dimension "d130" = 43.7
extrude "Extrude23" cut sketch "Sketch24" against normal blind 6 contours A5 | A6 | A7 | A8 bodies 1
extrude "Extrude24" cut sketch "Sketch24" against normal blind 2 contours A9 | A10 | A11 | A12 | A13 | A14 bodies 1
sketch "Sketch25" plane through (0, 0, 0) normal (-1, 0, 0) x (0, -1, 0)
  line L0 (-1, 24.5) -> (-189, 24.5)
  line L1 (-189, 0) -> (-1, 0)
  line L2 (-1, 7.45) -> (-184, 7.45)
  line L3 (-184, 7.45) -> (-184, 5.2)
  line L4 (-184, 5.2) -> (-1, 5.2)
  line L5 (-1, 5.2) -> (-1, 7.45)
  line L6 (-16.75, 0) -> (-11.25, 0)
  dimension "d121" = 2.25
  dimension "d132" = 5.2
extrude "Extrude25" add sketch "Sketch25" along normal blind 3.3 bodies 1
sketch "Sketch26" plane through (109, 0, 0) normal (1, 0, 0) x (0, 1, 0)
  line L0 (1, 24.5) -> (1, 0)
  line L1 (1, 0) -> (189, 0)
  line L2 (189, 0) -> (189, 24.5)
  line L3 (189, 24.5) -> (1, 24.5)
  line L4 (1, 7.45) -> (189, 7.45)
  line L5 (189, 7.45) -> (189, 5.2)
  line L6 (189, 5.2) -> (1, 5.2)
  line L7 (1, 5.2) -> (1, 7.45)
  line L8 (189, 0) -> (1, 0)
  dimension "d124" = 2.25
  dimension "d131" = 5.2
extrude "Extrude26" add sketch "Sketch26" along normal blind 3.3 contours L0 L2 L4 L5 L6 L7 bodies 1
sketch "Sketch27" plane through (0, 190, 0) normal (0, 1, 0) x (-1, 0, 0)
  line L0 (-108, 24.5) -> (-108, 0)
  line L1 (-108, 0) -> (-1, 0)
  line L2 (-1, 0) -> (-1, 24.5)
  line L3 (-1, 24.5) -> (-108, 24.5)
  circle A0 centre (-54.5, 6) radius 1.375
  point P0 (-54.5, 0)
  dimension "d133" = 2.75
  dimension "d134" = 6
  dimension "d135" = 53.5
extrude "Extrude27" cut sketch "Sketch27" against normal blind 3 contours A0 bodies 1
